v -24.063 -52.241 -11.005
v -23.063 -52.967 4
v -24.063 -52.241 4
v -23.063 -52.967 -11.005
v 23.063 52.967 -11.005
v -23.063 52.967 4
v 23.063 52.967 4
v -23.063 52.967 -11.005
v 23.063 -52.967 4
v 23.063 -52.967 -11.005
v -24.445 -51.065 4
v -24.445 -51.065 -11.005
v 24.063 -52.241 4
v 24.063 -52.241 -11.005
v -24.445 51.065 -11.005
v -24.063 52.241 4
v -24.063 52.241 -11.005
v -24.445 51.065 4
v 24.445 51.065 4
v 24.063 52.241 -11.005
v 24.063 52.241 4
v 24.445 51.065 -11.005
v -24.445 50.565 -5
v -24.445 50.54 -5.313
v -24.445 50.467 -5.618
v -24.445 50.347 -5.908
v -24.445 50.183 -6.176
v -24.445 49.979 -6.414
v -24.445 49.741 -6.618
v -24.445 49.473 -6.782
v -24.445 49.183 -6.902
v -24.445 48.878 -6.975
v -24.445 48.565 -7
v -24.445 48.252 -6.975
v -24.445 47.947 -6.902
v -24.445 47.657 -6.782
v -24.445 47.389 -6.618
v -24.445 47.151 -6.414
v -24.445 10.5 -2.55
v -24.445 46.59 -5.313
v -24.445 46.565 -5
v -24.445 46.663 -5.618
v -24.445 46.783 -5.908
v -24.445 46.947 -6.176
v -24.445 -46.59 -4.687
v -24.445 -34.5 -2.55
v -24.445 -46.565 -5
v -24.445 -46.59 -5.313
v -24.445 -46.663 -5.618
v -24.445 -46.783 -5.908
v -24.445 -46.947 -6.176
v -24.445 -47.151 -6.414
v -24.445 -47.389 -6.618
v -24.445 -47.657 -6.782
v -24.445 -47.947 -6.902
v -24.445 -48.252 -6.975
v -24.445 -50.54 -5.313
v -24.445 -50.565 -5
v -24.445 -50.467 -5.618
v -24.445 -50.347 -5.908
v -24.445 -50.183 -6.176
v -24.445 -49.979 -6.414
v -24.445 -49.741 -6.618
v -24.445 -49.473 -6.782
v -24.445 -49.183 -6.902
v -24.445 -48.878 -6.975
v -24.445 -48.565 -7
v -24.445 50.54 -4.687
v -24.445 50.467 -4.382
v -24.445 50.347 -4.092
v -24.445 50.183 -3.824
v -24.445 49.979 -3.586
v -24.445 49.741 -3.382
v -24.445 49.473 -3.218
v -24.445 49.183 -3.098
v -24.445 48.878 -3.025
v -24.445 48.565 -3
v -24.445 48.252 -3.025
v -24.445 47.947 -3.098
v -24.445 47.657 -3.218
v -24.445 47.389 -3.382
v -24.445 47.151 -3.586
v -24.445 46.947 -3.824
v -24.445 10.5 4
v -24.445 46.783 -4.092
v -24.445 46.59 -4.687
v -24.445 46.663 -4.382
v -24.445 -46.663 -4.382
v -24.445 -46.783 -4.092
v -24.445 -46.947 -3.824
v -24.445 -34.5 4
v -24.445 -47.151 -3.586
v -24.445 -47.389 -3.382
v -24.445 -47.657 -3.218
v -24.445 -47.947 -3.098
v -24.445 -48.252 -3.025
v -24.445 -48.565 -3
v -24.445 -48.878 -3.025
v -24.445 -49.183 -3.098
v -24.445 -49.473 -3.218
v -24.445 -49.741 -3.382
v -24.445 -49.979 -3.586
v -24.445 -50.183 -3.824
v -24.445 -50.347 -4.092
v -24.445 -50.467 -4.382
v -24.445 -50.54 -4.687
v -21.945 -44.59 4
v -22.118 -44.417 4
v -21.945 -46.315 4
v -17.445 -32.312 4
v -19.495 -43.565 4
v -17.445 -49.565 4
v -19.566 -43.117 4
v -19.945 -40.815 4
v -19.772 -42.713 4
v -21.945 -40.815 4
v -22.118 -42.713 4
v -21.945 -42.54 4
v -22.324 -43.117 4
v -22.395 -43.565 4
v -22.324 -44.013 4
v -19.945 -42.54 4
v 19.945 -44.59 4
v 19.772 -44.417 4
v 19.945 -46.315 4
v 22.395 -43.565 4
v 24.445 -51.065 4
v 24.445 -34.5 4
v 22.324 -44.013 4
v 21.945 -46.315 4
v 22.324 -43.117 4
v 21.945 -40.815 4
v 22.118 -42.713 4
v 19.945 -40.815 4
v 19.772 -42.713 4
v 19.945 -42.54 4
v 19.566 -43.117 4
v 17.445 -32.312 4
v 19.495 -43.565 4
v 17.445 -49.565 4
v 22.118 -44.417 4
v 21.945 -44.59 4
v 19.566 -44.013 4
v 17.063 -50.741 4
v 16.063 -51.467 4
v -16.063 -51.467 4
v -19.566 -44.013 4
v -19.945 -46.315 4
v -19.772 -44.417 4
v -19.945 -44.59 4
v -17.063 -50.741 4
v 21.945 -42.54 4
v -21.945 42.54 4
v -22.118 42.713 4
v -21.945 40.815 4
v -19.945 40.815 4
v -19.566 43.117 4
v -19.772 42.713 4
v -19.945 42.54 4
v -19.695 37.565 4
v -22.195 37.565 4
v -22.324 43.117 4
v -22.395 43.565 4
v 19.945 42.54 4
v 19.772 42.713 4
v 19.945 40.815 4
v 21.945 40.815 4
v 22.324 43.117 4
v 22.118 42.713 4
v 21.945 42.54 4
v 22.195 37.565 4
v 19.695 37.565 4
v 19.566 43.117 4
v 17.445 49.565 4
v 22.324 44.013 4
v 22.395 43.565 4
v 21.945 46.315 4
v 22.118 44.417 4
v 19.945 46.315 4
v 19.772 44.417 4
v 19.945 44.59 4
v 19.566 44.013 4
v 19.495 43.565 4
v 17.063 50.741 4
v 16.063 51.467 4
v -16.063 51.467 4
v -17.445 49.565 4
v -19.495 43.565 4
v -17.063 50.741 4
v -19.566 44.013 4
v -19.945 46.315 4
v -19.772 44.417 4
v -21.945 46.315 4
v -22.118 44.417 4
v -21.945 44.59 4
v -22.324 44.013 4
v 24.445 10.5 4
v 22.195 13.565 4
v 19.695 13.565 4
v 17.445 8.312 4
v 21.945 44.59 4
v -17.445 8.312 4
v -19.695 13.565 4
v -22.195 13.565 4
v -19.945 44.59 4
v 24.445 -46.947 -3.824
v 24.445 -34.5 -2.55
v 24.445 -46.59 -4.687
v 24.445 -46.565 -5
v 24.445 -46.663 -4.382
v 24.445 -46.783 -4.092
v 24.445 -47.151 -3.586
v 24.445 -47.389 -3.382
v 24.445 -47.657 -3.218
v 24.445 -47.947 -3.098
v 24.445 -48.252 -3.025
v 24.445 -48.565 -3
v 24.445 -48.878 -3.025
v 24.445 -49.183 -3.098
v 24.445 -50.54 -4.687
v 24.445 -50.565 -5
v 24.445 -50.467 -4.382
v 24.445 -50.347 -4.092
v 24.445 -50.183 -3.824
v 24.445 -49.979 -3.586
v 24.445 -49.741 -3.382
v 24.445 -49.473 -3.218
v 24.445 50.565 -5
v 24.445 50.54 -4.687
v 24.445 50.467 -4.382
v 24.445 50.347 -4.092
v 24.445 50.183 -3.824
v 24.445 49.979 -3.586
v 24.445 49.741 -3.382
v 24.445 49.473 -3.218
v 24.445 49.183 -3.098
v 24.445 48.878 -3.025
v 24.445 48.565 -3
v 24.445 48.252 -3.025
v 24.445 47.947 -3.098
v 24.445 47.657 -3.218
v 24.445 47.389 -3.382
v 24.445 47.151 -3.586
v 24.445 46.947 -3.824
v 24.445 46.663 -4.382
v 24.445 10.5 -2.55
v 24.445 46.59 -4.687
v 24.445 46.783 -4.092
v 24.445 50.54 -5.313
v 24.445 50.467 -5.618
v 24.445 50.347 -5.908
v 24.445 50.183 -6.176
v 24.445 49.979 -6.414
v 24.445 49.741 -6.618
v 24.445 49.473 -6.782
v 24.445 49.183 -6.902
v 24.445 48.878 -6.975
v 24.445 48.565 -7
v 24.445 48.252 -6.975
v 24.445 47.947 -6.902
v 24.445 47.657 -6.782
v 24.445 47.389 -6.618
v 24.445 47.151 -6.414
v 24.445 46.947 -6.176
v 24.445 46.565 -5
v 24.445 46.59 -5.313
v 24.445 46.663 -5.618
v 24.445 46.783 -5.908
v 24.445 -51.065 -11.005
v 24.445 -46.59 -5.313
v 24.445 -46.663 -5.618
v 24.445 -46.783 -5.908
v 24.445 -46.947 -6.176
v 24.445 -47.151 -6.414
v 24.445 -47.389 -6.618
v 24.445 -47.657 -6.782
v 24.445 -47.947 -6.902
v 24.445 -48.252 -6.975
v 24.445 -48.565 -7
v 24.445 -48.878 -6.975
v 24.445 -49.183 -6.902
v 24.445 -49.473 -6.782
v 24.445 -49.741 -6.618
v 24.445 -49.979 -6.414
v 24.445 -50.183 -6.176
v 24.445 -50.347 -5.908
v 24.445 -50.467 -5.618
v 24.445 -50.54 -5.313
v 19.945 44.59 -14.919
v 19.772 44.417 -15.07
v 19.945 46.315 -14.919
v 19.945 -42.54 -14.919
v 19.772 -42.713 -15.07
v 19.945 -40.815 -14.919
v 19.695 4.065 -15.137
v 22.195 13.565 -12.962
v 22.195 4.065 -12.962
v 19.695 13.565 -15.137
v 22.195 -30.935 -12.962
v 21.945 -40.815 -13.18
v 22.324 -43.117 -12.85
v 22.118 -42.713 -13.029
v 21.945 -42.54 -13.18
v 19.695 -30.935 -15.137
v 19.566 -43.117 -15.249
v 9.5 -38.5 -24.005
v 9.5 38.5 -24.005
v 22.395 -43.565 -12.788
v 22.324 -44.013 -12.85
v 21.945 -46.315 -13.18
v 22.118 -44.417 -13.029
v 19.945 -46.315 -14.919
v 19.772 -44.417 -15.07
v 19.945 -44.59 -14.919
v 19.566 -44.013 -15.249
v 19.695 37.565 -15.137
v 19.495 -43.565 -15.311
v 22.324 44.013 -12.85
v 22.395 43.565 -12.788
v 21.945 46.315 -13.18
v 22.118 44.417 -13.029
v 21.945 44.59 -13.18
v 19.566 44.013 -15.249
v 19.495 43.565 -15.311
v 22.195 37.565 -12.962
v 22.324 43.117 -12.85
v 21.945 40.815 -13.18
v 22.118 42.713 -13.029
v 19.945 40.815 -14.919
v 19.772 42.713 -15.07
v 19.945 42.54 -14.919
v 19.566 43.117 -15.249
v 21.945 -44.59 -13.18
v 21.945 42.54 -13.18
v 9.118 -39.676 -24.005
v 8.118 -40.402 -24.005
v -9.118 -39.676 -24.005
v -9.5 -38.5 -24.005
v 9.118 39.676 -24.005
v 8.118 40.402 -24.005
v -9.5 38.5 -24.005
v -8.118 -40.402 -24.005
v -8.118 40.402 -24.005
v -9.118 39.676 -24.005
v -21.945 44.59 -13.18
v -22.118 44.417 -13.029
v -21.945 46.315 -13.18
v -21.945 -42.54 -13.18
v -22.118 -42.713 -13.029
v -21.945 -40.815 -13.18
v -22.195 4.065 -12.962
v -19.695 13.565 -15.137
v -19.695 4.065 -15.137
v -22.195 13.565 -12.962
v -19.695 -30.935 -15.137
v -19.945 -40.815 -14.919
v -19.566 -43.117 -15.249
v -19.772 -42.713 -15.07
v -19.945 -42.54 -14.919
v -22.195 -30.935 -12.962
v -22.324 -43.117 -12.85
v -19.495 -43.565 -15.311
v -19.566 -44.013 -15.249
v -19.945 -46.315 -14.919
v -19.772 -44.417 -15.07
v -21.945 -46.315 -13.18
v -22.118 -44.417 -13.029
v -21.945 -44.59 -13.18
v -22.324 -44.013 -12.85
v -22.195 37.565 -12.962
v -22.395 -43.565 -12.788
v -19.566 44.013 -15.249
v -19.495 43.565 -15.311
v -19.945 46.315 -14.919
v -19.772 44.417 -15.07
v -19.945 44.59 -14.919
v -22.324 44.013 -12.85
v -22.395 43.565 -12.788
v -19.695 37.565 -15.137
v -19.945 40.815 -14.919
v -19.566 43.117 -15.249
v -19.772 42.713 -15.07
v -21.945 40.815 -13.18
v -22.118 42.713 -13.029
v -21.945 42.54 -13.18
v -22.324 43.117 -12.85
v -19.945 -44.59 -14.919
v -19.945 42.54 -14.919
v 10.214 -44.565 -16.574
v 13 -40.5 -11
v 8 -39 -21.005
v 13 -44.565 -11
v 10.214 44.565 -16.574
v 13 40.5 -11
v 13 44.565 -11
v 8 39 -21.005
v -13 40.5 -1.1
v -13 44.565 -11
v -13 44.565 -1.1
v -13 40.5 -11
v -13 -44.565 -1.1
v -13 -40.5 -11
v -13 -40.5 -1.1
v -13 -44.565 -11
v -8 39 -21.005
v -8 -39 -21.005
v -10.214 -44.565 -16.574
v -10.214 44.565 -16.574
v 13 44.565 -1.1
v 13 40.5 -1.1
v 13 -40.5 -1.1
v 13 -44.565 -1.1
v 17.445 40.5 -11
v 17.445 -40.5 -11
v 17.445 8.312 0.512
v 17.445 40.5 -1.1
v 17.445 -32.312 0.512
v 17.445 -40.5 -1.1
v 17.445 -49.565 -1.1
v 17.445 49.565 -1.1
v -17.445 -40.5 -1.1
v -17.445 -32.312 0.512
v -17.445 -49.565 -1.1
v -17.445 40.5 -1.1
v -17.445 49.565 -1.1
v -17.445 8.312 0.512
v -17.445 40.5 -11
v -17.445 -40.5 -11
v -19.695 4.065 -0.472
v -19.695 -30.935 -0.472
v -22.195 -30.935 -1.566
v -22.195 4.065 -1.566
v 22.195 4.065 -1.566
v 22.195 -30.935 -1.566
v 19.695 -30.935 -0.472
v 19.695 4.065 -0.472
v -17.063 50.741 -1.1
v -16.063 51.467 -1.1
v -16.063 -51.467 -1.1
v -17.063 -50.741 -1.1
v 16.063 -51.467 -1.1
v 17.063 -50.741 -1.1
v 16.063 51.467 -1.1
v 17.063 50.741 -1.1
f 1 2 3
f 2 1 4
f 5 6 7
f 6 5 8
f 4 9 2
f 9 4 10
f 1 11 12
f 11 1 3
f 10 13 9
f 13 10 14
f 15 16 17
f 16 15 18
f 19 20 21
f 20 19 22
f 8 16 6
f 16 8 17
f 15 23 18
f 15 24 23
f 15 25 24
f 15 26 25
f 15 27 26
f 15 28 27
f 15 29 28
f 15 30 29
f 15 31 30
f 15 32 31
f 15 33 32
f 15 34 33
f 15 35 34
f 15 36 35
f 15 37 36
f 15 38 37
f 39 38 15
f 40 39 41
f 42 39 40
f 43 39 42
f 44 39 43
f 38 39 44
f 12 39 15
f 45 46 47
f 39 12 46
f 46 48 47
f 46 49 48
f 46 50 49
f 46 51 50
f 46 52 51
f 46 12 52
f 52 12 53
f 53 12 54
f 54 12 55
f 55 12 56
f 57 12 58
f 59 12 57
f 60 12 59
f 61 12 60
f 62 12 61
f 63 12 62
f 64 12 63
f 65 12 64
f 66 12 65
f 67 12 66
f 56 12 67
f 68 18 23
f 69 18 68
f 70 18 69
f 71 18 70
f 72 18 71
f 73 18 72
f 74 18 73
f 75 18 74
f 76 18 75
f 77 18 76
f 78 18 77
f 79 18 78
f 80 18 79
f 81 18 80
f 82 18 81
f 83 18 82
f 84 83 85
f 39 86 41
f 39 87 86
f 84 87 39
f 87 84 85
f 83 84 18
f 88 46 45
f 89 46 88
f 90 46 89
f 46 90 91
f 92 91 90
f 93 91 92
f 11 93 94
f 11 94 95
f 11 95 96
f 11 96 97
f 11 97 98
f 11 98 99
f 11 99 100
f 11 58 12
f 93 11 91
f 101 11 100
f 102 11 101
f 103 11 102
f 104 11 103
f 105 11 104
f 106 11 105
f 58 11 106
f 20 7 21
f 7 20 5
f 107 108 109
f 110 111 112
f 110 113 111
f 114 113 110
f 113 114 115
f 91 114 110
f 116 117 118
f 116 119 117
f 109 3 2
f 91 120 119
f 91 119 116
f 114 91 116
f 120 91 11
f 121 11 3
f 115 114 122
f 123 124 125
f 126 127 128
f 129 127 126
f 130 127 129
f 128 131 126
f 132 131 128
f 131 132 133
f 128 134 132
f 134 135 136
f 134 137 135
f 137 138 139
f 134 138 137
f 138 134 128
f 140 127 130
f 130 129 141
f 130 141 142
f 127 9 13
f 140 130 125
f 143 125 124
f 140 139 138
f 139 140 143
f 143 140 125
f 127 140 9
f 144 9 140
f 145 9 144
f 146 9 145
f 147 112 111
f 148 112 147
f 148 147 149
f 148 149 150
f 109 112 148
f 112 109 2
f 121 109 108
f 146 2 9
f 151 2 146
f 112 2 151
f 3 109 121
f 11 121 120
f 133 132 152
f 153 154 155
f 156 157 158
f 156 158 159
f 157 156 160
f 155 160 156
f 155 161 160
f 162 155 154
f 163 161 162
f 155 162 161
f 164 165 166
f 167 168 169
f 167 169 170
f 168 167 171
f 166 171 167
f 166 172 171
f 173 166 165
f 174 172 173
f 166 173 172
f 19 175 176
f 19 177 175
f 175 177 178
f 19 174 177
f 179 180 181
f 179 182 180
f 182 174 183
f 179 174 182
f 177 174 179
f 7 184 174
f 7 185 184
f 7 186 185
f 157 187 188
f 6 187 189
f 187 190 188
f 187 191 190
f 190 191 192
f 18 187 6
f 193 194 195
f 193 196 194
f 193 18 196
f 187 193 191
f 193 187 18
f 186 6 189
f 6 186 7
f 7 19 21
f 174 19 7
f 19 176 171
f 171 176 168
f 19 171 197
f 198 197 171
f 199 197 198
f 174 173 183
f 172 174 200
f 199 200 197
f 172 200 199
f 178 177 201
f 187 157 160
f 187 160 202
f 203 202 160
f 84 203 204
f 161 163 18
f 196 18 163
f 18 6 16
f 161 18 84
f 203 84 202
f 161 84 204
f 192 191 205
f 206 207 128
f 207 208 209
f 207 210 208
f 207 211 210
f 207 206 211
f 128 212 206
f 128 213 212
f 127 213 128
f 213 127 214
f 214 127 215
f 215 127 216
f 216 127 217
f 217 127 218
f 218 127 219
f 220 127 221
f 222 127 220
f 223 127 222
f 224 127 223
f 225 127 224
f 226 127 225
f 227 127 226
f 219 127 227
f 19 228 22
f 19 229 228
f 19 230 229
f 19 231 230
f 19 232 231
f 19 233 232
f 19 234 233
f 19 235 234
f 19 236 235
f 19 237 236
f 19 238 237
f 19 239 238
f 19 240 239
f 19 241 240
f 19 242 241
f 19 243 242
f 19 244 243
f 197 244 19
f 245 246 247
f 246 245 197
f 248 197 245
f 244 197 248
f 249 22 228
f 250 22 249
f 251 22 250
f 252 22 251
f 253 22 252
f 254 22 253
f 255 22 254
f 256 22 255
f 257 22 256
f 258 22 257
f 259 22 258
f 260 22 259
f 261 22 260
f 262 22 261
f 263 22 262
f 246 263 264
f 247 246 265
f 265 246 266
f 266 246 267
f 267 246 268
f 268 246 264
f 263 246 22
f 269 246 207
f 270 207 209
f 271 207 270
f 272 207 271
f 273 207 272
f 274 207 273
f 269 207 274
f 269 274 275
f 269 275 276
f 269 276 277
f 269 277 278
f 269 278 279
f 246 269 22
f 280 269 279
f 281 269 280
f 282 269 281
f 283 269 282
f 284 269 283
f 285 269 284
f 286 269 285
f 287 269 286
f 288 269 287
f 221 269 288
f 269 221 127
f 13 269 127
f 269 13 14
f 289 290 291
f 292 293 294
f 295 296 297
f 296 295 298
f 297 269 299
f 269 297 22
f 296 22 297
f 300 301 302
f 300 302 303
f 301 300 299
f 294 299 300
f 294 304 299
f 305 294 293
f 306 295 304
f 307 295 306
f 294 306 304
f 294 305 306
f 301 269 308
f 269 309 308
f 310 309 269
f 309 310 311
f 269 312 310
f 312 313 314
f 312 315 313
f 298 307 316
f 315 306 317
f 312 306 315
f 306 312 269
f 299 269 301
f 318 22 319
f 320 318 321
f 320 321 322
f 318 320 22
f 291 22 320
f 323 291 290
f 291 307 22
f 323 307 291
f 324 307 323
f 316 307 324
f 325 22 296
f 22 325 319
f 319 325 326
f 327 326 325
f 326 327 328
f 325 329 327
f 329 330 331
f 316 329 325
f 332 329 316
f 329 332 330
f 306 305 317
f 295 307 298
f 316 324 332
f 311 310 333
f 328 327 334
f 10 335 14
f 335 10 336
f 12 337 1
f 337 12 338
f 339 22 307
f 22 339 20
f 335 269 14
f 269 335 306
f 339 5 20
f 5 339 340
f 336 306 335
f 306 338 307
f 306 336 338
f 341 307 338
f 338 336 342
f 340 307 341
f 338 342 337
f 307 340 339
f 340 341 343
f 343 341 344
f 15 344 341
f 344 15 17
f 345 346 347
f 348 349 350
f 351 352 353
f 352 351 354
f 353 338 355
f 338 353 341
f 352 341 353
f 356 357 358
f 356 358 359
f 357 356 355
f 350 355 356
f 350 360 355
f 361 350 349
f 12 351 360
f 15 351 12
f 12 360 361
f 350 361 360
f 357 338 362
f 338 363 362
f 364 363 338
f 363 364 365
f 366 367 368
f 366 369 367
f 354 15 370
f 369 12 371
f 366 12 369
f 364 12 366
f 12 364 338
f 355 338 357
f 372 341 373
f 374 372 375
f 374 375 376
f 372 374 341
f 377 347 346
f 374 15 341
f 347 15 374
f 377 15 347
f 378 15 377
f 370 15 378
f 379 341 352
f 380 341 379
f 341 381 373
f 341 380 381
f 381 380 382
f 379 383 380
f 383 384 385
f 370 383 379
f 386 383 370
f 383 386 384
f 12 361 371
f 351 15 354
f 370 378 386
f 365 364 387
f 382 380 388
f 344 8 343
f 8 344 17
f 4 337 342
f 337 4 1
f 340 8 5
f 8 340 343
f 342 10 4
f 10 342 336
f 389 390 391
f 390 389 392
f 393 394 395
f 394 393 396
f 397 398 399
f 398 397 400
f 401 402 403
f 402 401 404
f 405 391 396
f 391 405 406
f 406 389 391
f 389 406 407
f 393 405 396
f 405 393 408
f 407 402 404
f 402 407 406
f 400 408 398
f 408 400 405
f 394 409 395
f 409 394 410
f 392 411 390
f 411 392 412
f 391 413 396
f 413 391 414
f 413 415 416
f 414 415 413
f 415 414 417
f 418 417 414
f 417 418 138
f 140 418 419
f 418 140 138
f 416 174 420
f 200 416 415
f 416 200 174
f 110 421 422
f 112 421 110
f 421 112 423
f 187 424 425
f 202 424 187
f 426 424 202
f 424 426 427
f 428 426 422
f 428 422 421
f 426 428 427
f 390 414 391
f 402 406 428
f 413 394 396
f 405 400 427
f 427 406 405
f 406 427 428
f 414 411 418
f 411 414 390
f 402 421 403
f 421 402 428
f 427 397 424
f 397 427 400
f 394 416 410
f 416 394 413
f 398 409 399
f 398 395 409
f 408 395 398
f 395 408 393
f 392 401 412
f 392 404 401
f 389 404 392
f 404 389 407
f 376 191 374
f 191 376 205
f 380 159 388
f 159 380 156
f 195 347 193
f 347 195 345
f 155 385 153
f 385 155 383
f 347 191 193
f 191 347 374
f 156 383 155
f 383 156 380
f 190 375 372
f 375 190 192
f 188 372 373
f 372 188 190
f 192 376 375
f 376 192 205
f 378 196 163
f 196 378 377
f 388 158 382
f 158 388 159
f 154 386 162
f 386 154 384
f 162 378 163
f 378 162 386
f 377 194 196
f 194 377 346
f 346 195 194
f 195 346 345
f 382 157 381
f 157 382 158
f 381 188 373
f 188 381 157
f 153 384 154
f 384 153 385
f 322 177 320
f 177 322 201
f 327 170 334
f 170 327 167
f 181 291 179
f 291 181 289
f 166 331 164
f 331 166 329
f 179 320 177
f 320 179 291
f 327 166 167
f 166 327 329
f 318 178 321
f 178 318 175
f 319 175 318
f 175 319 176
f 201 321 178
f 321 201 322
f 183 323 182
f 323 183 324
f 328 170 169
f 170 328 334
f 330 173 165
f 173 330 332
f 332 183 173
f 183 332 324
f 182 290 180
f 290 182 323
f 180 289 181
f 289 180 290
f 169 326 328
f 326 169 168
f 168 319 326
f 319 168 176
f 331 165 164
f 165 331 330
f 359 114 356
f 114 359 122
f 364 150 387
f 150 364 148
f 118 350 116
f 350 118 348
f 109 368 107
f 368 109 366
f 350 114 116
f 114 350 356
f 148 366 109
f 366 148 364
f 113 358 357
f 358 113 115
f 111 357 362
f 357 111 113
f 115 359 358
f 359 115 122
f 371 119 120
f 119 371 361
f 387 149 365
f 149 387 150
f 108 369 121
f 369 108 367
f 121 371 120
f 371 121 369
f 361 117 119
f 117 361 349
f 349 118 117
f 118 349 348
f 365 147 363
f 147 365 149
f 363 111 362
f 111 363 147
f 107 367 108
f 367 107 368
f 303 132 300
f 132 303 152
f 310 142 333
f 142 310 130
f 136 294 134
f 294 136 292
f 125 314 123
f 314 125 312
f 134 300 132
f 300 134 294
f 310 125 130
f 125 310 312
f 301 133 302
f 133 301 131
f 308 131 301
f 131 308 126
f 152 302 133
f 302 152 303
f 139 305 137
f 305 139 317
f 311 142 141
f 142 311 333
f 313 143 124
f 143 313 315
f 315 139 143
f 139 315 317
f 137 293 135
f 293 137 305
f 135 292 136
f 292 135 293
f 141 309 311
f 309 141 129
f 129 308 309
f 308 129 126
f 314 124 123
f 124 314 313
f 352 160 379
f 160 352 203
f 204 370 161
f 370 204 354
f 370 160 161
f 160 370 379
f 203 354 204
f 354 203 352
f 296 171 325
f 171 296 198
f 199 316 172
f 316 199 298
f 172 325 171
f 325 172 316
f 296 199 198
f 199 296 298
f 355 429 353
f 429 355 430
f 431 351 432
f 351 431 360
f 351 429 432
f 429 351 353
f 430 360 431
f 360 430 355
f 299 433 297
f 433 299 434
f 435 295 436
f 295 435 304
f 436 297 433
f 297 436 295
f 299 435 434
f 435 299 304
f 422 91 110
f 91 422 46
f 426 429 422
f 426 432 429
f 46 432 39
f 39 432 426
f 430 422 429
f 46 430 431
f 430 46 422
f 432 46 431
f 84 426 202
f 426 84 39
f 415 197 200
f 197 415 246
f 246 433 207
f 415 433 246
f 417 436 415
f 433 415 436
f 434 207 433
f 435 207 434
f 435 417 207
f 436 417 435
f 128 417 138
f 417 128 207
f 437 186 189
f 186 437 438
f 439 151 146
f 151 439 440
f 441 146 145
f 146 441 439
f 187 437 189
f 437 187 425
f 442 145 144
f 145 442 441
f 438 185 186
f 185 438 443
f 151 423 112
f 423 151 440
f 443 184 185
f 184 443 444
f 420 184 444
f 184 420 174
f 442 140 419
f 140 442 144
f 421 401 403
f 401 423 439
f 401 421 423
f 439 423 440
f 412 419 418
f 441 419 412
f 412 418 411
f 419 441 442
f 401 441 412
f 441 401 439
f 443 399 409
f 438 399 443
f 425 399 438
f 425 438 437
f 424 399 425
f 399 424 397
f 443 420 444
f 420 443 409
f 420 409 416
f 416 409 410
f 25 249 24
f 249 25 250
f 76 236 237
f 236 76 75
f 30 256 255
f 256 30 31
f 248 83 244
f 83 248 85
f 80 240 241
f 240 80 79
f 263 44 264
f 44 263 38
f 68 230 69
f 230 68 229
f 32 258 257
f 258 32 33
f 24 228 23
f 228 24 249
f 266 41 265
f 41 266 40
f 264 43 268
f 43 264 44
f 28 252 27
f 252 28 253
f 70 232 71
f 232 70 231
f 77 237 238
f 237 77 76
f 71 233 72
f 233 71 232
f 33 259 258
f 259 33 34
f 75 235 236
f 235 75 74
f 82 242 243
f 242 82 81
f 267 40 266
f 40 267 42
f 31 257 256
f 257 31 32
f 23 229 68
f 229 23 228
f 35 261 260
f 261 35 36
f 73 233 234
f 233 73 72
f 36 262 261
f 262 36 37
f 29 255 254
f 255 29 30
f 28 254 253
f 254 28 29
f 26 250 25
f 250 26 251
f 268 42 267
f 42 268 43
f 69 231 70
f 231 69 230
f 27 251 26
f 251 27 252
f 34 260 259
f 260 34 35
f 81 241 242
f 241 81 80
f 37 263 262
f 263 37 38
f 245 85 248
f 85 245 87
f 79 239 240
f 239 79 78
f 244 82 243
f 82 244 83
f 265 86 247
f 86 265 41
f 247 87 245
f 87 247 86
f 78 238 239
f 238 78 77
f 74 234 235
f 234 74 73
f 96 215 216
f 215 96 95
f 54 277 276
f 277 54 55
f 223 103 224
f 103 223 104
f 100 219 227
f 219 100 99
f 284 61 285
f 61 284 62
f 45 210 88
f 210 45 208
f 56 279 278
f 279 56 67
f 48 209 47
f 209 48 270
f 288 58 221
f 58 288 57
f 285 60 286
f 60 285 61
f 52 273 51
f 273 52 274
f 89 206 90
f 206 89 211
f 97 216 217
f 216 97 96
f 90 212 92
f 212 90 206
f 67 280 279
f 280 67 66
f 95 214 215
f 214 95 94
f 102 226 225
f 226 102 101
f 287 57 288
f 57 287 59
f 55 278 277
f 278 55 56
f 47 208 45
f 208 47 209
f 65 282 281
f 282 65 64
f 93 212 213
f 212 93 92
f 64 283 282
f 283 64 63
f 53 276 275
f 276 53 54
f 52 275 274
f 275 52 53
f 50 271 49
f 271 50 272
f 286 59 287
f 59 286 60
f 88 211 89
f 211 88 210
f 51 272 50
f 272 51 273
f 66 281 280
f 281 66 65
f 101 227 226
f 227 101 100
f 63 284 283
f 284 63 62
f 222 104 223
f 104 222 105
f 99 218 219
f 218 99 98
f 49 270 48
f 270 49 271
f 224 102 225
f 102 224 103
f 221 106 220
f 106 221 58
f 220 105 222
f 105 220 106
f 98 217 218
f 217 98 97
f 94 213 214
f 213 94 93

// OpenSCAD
// file: ttgo_t22_V1_1_model.scad
// ttgo_20191212_t22_V1.1 model

module ttgoV2Model()
{
    // http://www.lilygo.cn/claprod_view.aspx?TypeId=62&Id=1281&FId=t28:62:28
    ttgox = 32.89;
    ttgoy = 100.13;
    ttgoSMD = 3; ///< SMD Standoff
    ttgoPCB = 2; ///< PCB thickness
    ttgoPCBHoleOff = 2.36;
    ttgoPCBHoleDia = 2;
    rd=2;
    //%cube([ttgox,ttgoy,1], center=true);
    
    // OLED Screen
    color("black")
    translate([ttgox/2-6-7.5,+ttgoy/2-25,ttgoPCB/2+ttgoSMD+1+2])
        union()
        {
            cube([15,25,2],center=true);
        }
    color("blue")
    translate([0,+ttgoy/2-25,ttgoPCB/2+ttgoSMD+1])
        union()
        {
            cube([30,30,2],center=true);
        }
    
    // SMD ANTENNA
    translate([ttgox/2-7/2,-ttgoy/2+40,ttgoPCB/2+10/2])
        union()
        {
            cube([7,6,10],center=true);
            translate([6/2,0,1])
              rotate([0,90,0])
                cylinder(r=6/2, h=6);
        }
    translate([ttgox/2-7/2,-ttgoy/2+40,-ttgoPCB/2-3/2])
        union()
        {
            cube([7,6,3],center=true);
        }

    // USB
    translate([-ttgox/2+6/2-1,2,ttgoPCB/2+3/2])
            cube([6,6,3],center=true);
        
    // Button
    translate([-ttgox/2+5/2-1,-7,ttgoPCB/2+3/2])
            cube([5,5,3],center=true);
    translate([-ttgox/2+5/2-1,-7-9.5,ttgoPCB/2+3/2])
            cube([5,5,3],center=true);
    translate([-ttgox/2+5/2-1,-7-9.5-9.5,ttgoPCB/2+3/2])
            cube([5,5,3],center=true);
            
    // TopStandoff
    //color("grey")
    translate([0,0,ttgoPCB/2])
        hull()
        {
            translate([ttgox/2-rd,ttgoy/2-rd,0])
                cylinder(r=rd,h=ttgoSMD,$fn=100);
            translate([-ttgox/2+rd,-ttgoy/2+rd,0])
                cylinder(r=rd,h=ttgoSMD,$fn=100);
            translate([ttgox/2-rd,-ttgoy/2+rd,0])
                cylinder(r=rd,h=ttgoSMD,$fn=100);
            translate([-ttgox/2+rd,ttgoy/2-rd,0])
                cylinder(r=rd,h=ttgoSMD,$fn=100);
        }
    
    // PCB
    //color("green")
    difference()
    {   
        hull()
        {
            translate([ttgox/2-rd,ttgoy/2-rd,0])
                cylinder(r=rd,h=ttgoPCB,$fn=100, center=true);
            translate([-ttgox/2+rd,-ttgoy/2+rd,0])
                cylinder(r=rd,h=ttgoPCB,$fn=100, center=true);
            translate([ttgox/2-rd,-ttgoy/2+rd,0])
                cylinder(r=rd,h=ttgoPCB,$fn=100, center=true);
            translate([-ttgox/2+rd,ttgoy/2-rd,0])
                cylinder(r=rd,h=ttgoPCB,$fn=100, center=true);
        }

        // Holes
        union()
        {
            translate([ttgox/2-ttgoPCBHoleOff,ttgoy/2-ttgoPCBHoleOff,0])
                cylinder(r=ttgoPCBHoleDia/2,h=1+ttgoPCB,$fn=100, center=true);
            translate([-ttgox/2+ttgoPCBHoleOff,-ttgoy/2+ttgoPCBHoleOff,0])
                cylinder(r=ttgoPCBHoleDia/2,h=1+ttgoPCB,$fn=100, center=true);
            translate([ttgox/2-ttgoPCBHoleOff,-ttgoy/2+ttgoPCBHoleOff,0])
                cylinder(r=ttgoPCBHoleDia/2,h=1+ttgoPCB,$fn=100, center=true);
            translate([-ttgox/2+ttgoPCBHoleOff,ttgoy/2-ttgoPCBHoleOff,0])
                cylinder(r=ttgoPCBHoleDia/2,h=1+ttgoPCB,$fn=100, center=true);
        }
    }


    // Battery
    //color("grey")
    hull()
    {
        translate([0,0,-ttgoPCB/2-7/2])
                cube([23,78,7],center=true);
        translate([0,0,-ttgoPCB/2-20])
                cube([16,78,0.01],center=true);
    }
}

module ttgoV2Model_PCBOnly()
{
    // http://www.lilygo.cn/claprod_view.aspx?TypeId=62&Id=1281&FId=t28:62:28
    ttgox = 32.89;
    ttgoy = 100.13;
    ttgoSMD = 4; ///< SMD Standoff
    ttgoPCB = 2; ///< PCB thickness
    ttgoPCBHoleOff = 2.36;
    ttgoPCBHoleDia = 2;
    rd=2;
    
    // PCB
    //color("green")
    difference()
    {   
        hull()
        {
            translate([ttgox/2-rd,ttgoy/2-rd,0])
                cylinder(r=rd,h=ttgoPCB,$fn=100, center=true);
            translate([-ttgox/2+rd,-ttgoy/2+rd,0])
                cylinder(r=rd,h=ttgoPCB,$fn=100, center=true);
            translate([ttgox/2-rd,-ttgoy/2+rd,0])
                cylinder(r=rd,h=ttgoPCB,$fn=100, center=true);
            translate([-ttgox/2+rd,ttgoy/2-rd,0])
                cylinder(r=rd,h=ttgoPCB,$fn=100, center=true);
        }

        // Holes
        union()
        {
            translate([ttgox/2-ttgoPCBHoleOff,ttgoy/2-ttgoPCBHoleOff,0])
                cylinder(r=ttgoPCBHoleDia/2,h=1+ttgoPCB,$fn=100, center=true);
            translate([-ttgox/2+ttgoPCBHoleOff,-ttgoy/2+ttgoPCBHoleOff,0])
                cylinder(r=ttgoPCBHoleDia/2,h=1+ttgoPCB,$fn=100, center=true);
            translate([ttgox/2-ttgoPCBHoleOff,-ttgoy/2+ttgoPCBHoleOff,0])
                cylinder(r=ttgoPCBHoleDia/2,h=1+ttgoPCB,$fn=100, center=true);
            translate([-ttgox/2+ttgoPCBHoleOff,ttgoy/2-ttgoPCBHoleOff,0])
                cylinder(r=ttgoPCBHoleDia/2,h=1+ttgoPCB,$fn=100, center=true);
        }
    }
}

ttgoV2Model();
// main file
// ttgo_20191212_t22_V1.1 case
use <ttgo_t22_V1_1_model.scad> 

smdUseIPEX = false; ///< External IPEX to SMA antenna else onboard antenna

production = true; // Ensure prints in ready orientation

topCaseEnable = false;
bottomCaseEnable = true;

module ttgoV2Bottom()
{
    // http://www.lilygo.cn/claprod_view.aspx?TypeId=62&Id=1281&FId=t28:62:28

    caseThickness = 3;
    caseZipTieExtra = 10;
    
    holeSMA_dia = 7;
    holeSMA_thickness = 1;
    holeSpacing = 5;

    /////////////////////////////////////////////////////////////////////////
    ttgoxExact = 32.89;
    ttgoyExact = 100.13;
    ttgox = ttgoxExact + caseThickness * 2 + caseZipTieExtra;
    ttgoy = ttgoyExact + caseThickness * 2;
    ttgoSMD = 3; ///< SMD Standoff
    ttgoPCB = 2; ///< PCB thickness
    ttgoPCBHoleOff = 2.36;
    ttgoPCBHoleDia = 2;
    rd=2;
    
    // TopStandoff
    //color("grey")
    translate([0,0,ttgoPCB/2])
        hull()
        {
            translate([ttgox/2-rd,ttgoy/2-rd,0])
                cylinder(r=rd,h=ttgoSMD,$fn=10);
            translate([-ttgox/2+rd,-ttgoy/2+rd,0])
                cylinder(r=rd,h=ttgoSMD,$fn=10);
            translate([ttgox/2-rd,-ttgoy/2+rd,0])
                cylinder(r=rd,h=ttgoSMD,$fn=10);
            translate([-ttgox/2+rd,ttgoy/2-rd,0])
                cylinder(r=rd,h=ttgoSMD,$fn=10);
        }
    
    // PCB
    //color("green")  
    hull()
    {
        translate([ttgox/2-rd,ttgoy/2-rd,0])
            cylinder(r=rd,h=ttgoPCB,$fn=10, center=true);
        translate([-ttgox/2+rd,-ttgoy/2+rd,0])
            cylinder(r=rd,h=ttgoPCB,$fn=10, center=true);
        translate([ttgox/2-rd,-ttgoy/2+rd,0])
            cylinder(r=rd,h=ttgoPCB,$fn=10, center=true);
        translate([-ttgox/2+rd,ttgoy/2-rd,0])
            cylinder(r=rd,h=ttgoPCB,$fn=10, center=true);
    }

    // Main Body
    hull()
    {
        translate([0,0,0])
        hull()
        {
            translate([ttgox/2-rd,ttgoy/2-rd,0])
                cylinder(r=rd,h=ttgoPCB,$fn=10, center=true);
            translate([-ttgox/2+rd,-ttgoy/2+rd,0])
                cylinder(r=rd,h=ttgoPCB,$fn=10, center=true);
            translate([ttgox/2-rd,-ttgoy/2+rd,0])
                cylinder(r=rd,h=ttgoPCB,$fn=10, center=true);
            translate([-ttgox/2+rd,ttgoy/2-rd,0])
                cylinder(r=rd,h=ttgoPCB,$fn=10, center=true);
        }
        translate([0,0,-ttgoPCB/2-7-caseThickness])
        hull()
        {
            translate([ttgox/2-rd,ttgoy/2-rd,0])
                cylinder(r=rd,h=0.01,$fn=10, center=true);
            translate([-ttgox/2+rd,-ttgoy/2+rd,0])
                cylinder(r=rd,h=0.01,$fn=10, center=true);
            translate([ttgox/2-rd,-ttgoy/2+rd,0])
                cylinder(r=rd,h=0.01,$fn=10, center=true);
            translate([-ttgox/2+rd,ttgoy/2-rd,0])
                cylinder(r=rd,h=0.01,$fn=10, center=true);
        }
        translate([0,0,-ttgoPCB/2-20-caseThickness])
        hull()
        {
            ttgox2=16+caseThickness;
            ttgoy2=78+caseThickness;
            translate([ttgox2/2-rd,ttgoy2/2-rd,0])
                cylinder(r=rd,h=0.01,$fn=10, center=true);
            translate([-ttgox2/2+rd,-ttgoy2/2+rd,0])
                cylinder(r=rd,h=0.01,$fn=10, center=true);
            translate([ttgox2/2-rd,-ttgoy2/2+rd,0])
                cylinder(r=rd,h=0.01,$fn=10, center=true);
            translate([-ttgox2/2+rd,ttgoy2/2-rd,0])
                cylinder(r=rd,h=0.01,$fn=10, center=true);
        }
    }
    

    // SMD Hole
    if (smdUseIPEX)
    {
        // IPEX SMA Antenna Hole
        SMAExtra=10;
        SMAMountThickness=1;
        hull()
        {
            translate([0,-(ttgoyExact/2+SMAExtra+SMAMountThickness)/2,+ttgoPCB/2+ttgoSMD])
                cube([(holeSMA_dia+holeSpacing*2+caseThickness*2),(ttgoyExact/2+SMAExtra+SMAMountThickness),0.01], center=true);
            translate([0,-(ttgoyExact/2+SMAExtra+SMAMountThickness)/2,-ttgoPCB/2-(holeSMA_dia+holeSpacing)/2])
                rotate([90,0,0])
                    cylinder(r=(holeSMA_dia/2 + holeSpacing + caseThickness/2), h=(ttgoyExact/2+SMAExtra+SMAMountThickness), $fn=20, center=true);
            translate([0,-(78/2)/2,-ttgoPCB/2-20-caseThickness])
                cube([(holeSMA_dia+holeSpacing*2),(78/2),0.01], center=true);
        }
    }
}

module ttgoV2Top()
{
    // http://www.lilygo.cn/claprod_view.aspx?TypeId=62&Id=1281&FId=t28:62:28

    caseTopThickness = 1;
    caseThickness = 3;
    caseZipTieExtra = 10;
    
    holeSMA_dia = 7;
    holeSMA_thickness = 1;
    holeSpacing = 5;

    /////////////////////////////////////////////////////////////////////////
    ttgoxExact =  32.89;
    ttgoyExact = 100.13;
    ttgox = ttgoxExact + caseThickness * 2 + caseZipTieExtra;
    ttgoy = ttgoyExact + caseThickness * 2;
    ttgoSMD = 3; ///< SMD Standoff
    ttgoPCB = 2; ///< PCB thickness
    ttgoPCBHoleOff = 2.36;
    ttgoPCBHoleDia = 2;
    rd=2;
    
    translate([0,0,ttgoPCB/2+ttgoSMD])
        hull()
        {
            translate([ttgox/2-rd,ttgoy/2-rd,0])
                cylinder(r=rd,h=ttgoSMD,$fn=10);
            translate([-ttgox/2+rd,-ttgoy/2+rd,0])
                cylinder(r=rd,h=ttgoSMD,$fn=10);
            translate([ttgox/2-rd,-ttgoy/2+rd,0])
                cylinder(r=rd,h=ttgoSMD,$fn=10);
            translate([-ttgox/2+rd,ttgoy/2-rd,0])
                cylinder(r=rd,h=ttgoSMD,$fn=10);

            // SMD Hole
            if (smdUseIPEX)
            {
                SMAExtra=10;
                SMAMountThickness=1;
                translate([0,-(ttgoyExact/2+SMAExtra+SMAMountThickness)/2,ttgoSMD/2])
                    cube([(holeSMA_dia+holeSpacing*2+caseThickness*2),(ttgoyExact/2+SMAExtra+SMAMountThickness),ttgoSMD], center=true);
            }
        }
}

module ttgoV2Cut()
{
    // http://www.lilygo.cn/claprod_view.aspx?TypeId=62&Id=1281&FId=t28:62:28
    caseThickness = 3;
    caseZipTieExtra = 10;

    holeSMA_dia = 7;
    holeSMA_thickness = 1;
    holeSpacing = 5;

    ///////////////////
    pcbTolx = 2;
    pcbToly = 3;
    ttgoxExact = 32.89;
    ttgoyExact = 100.13;
    ttgox = ttgoxExact + pcbTolx;
    ttgoy = ttgoyExact + pcbToly;
    ttgoSMD = 3; ///< SMD Standoff
    ttgoPCB = 2; ///< PCB thickness
    ttgoPCBHoleOff = 2.36;
    ttgoPCBHoleDia = 2;
    rd=2;
    //%cube([ttgox,ttgoy,1], center=true);
    
    // OLED Screen
    oledtol=10;
    color("black")
    translate([ttgoxExact/2-6-7.5,ttgoyExact/2-25,ttgoPCB/2+ttgoSMD+1+2])
        union()
        {
            cube([15,25,2+0.01],center=true);
        }
    color("blue")
    translate([0,ttgoyExact/2-25,ttgoPCB/2+ttgoSMD+1])
        union()
        {
            cube([30,30+oledtol,2],center=true);
        }

    // SMD ANTENNA
    if (!smdUseIPEX)
    {
        translate([ttgoxExact/2-7/2,-ttgoyExact/2+40,ttgoPCB/2+10/2])
            union()
            {
                tol = 0.5;
                cube([7,6,10],center=true);
                translate([6/2,0,1])
                    rotate([0,90,0])
                    cylinder(r=6/2, h=6);
                // Cover
                translate([-tol,0,1])
                hull()
                {
                    translate([-3.5,0,0])
                        rotate([0,90,0])
                        cylinder(r=(6+tol)/2, h=16);
                    translate([16/2-3.5,0,-(6+tol)/2-0.5-ttgoPCB])
                        cube([16,(6+tol),0.1],center=true);
                }
            }
        translate([ttgoxExact/2-7/2,-ttgoyExact/2+40,-ttgoPCB/2-4/2])
            cube([7,6,4],center=true);
    }

    // Ports Reference
    if (0)
    %union()
    {
        // USB
        translate([-ttgoxExact/2+6/2-1,2,ttgoPCB/2+3/2])
            cube([6+caseThickness,6,3],center=true);

        // Button
        translate([-ttgoxExact/2+5/2-1,-7,ttgoPCB/2+3/2])
            cube([5,5,3],center=true);
        translate([-ttgoxExact/2+5/2-1,-7-9.5,ttgoPCB/2+3/2])
            cube([5,5,3],center=true);
        translate([-ttgoxExact/2+5/2-1,-7-9.5-9.5,ttgoPCB/2+3/2])
            cube([5,5,3],center=true);     
    }

    // Port Cutout
    hull()
    {
        translate([-ttgoxExact/2+6/2-0.5-caseThickness,-12,ttgoPCB/2+3/2+5/2])
            cube([1,40,3+0.1+5],center=true);
        translate([-ttgoxExact/2+6/2-0.5-caseZipTieExtra-1,-12,ttgoPCB/2+3/2+5/2])
            cube([1,45,10+0.1+5],center=true);
    }

    // SMA Cutout
    if(!smdUseIPEX)
    {
        hull()
        {
            translate([-(-ttgoxExact/2+6/2-0.5-caseThickness),-12,ttgoPCB/2+3/2+5/2])
                cube([1,40,3+0.1+5],center=true);
            translate([-(-ttgoxExact/2+6/2-0.5-caseZipTieExtra-1),-12,ttgoPCB/2+3/2+5/2])
                cube([1,45,10+0.1+5],center=true);
        }
    }

    // TopStandoff
    //color("grey")
    translate([0,0,ttgoPCB/2])
        hull()
        {
            translate([ttgox/2-rd,ttgoy/2-rd,0])
                cylinder(r=rd,h=ttgoSMD+0.2,$fn=10);
            translate([-ttgox/2+rd,-ttgoy/2+rd,0])
                cylinder(r=rd,h=ttgoSMD+0.2,$fn=10);
            translate([ttgox/2-rd,-ttgoy/2+rd,0])
                cylinder(r=rd,h=ttgoSMD+0.2,$fn=10);
            translate([-ttgox/2+rd,ttgoy/2-rd,0])
                cylinder(r=rd,h=ttgoSMD+0.2,$fn=10);
        }
    
    extraCut = 0.1;

    // PCB
    //color("green")
    difference()
    {
        hull()
        {

            translate([ttgox/2-rd,ttgoy/2-rd,0])
                cylinder(r=rd,h=ttgoPCB+(extraCut*2),$fn=10, center=true);
            translate([-ttgox/2+rd,-ttgoy/2+rd,0])
                cylinder(r=rd,h=ttgoPCB+(extraCut*2),$fn=10, center=true);
            translate([ttgox/2-rd,-ttgoy/2+rd,0])
                cylinder(r=rd,h=ttgoPCB+(extraCut*2),$fn=10, center=true);
            translate([-ttgox/2+rd,ttgoy/2-rd,0])
                cylinder(r=rd,h=ttgoPCB+(extraCut*2),$fn=10, center=true);
        }
    }

    // Battery
    difference()
    {
        pcbBatTol=3; ///< Account for battery tolerance
        pcbLedgeX=0; ///5
        union()
        {
            //color("grey")
            hull()
            {
                translate([0,0,-ttgoPCB/2-10/2])
                    cube([23+pcbBatTol,ttgoy-pcbLedgeX,10],    center=true);
                translate([0,0,-ttgoPCB/2-20])
                    cube([16,78,0.01], center=true);
            }
            hull()
            {
                translate([0,0,-ttgoPCB/2-10/2])
                    cube([ttgox,78+pcbBatTol,10],    center=true);
                translate([0,0,-ttgoPCB/2-20])
                    cube([16,78,0.01], center=true);
            }
        }

        // Account For Lanyard Cutout
        translate([0,-(-ttgoy/2-holeSMA_dia+4),-ttgoPCB/2-5/2])
            cube([100,20,100], center=true);
    
        if (!smdUseIPEX)
        {
            translate([0,-ttgoy/2-holeSMA_dia+4,-ttgoPCB/2-5/2])
                cube([100,20,100], center=true);
        }
    }

    // SMD Hole
    if (smdUseIPEX)
    {
        SMAExtra=10;
        translate([0,-ttgoyExact/2-SMAExtra,-ttgoPCB/2-(holeSMA_dia+holeSpacing)/2])
            rotate([90,0,0])
            cylinder(r=holeSMA_dia/2, h=10+SMAExtra, $fn=20, center=true);
        hull()
        {
            translate([0,-(ttgoyExact/2+SMAExtra)/2,+ttgoPCB/2+ttgoSMD+0.01])
                cube([(holeSMA_dia+holeSpacing*2),(ttgoyExact/2+SMAExtra),0.01], center=true);
            translate([0,-(ttgoyExact/2+SMAExtra)/2,-ttgoPCB/2-(holeSMA_dia+holeSpacing)/2])
                rotate([90,0,0])
                cylinder(r=(holeSMA_dia/2 + holeSpacing), h=(ttgoyExact/2+SMAExtra), $fn=20, center=true);
            translate([0,-(78/2)/2,-ttgoPCB/2-20])
                cube([(holeSMA_dia+holeSpacing*2),(78/2),0.01], center=true);
        }
    }

    // ZipTie/M3Screw Slot
    translate([0,ttgoy/2-8,0])
    {
        translate([-ttgox/2-caseZipTieExtra/2+1.5,0,0])
        union()
        {
            cube([2,5.5,100], center=true);
            cylinder(r=3/2-0.05, h=100, center=true, $fn=20);
        }
        translate([-(-ttgox/2-caseZipTieExtra/2+1.5),0,0])
        union()
        {
            cube([2,5.5,100], center=true);
            cylinder(r=3/2-0.05, h=100, center=true, $fn=20);
        }
    }
    translate([0,-ttgoy/2+8,0])
    {
        translate([-ttgox/2-caseZipTieExtra/2+1.5,0,0])
        union()
        {
            cube([2,5.5,100], center=true);
            cylinder(r=3/2-0.05, h=100, center=true, $fn=20);
        }
        translate([-(-ttgox/2-caseZipTieExtra/2+1.5),0,0])
        union()
        {
            cube([2,5.5,100], center=true);
            cylinder(r=3/2-0.05, h=100, center=true, $fn=20);
        }
    }
    
    // Strap Slot
    translate([0,ttgoy/2-26,0])
    {
        // Typical Straps is around 2mm by 25mm
        translate([-ttgox/2-caseZipTieExtra/2+1.5,0,0])
            cube([2.5,24,100], center=true);
        translate([-(-ttgox/2-caseZipTieExtra/2+1.5),0,0])
            cube([2.5,24,100], center=true);
    }
    
    // Strap Slot
    translate([0,ttgoy/2-65,0])
    {
        // Typical Straps is around 2mm by 25mm
        translate([-ttgox/2-caseZipTieExtra/2+1.5,0,0])
            cube([2.5,35,100], center=true);
        translate([-(-ttgox/2-caseZipTieExtra/2+1.5),0,0])
            cube([2.5,35,100], center=true);
    }

    // Lanyard
    translate([0,+ttgoy/2-3,-ttgoPCB/2-4])
        rotate([0,90,0])
            cylinder(r=2,h=100,$fn=40, center=true);

    if (!smdUseIPEX)
    {
        translate([0,-(ttgoy/2-3),-ttgoPCB/2-4])
            rotate([0,90,0])
                cylinder(r=2,h=100,$fn=40, center=true);
    }
}

///////////////////////////////////////////////////////
// Output
if (production)
{
    // Production
    if (topCaseEnable)
    rotate([0,180,0])
    difference()
    {
        ttgoV2Top();
        ttgoV2Cut();
    }

    if (bottomCaseEnable)
    difference()
    {
        ttgoV2Bottom();
        ttgoV2Cut();
    }
}
else
{
    // Dev
    if (topCaseEnable)
    difference()
    {
        ttgoV2Top();
        ttgoV2Cut();
    }

    if (bottomCaseEnable)
    difference()
    {
        ttgoV2Bottom();
        ttgoV2Cut();
    }

    // Model
    //%ttgoV2Model();
    //%ttgoV2Model_PCBOnly();
}
